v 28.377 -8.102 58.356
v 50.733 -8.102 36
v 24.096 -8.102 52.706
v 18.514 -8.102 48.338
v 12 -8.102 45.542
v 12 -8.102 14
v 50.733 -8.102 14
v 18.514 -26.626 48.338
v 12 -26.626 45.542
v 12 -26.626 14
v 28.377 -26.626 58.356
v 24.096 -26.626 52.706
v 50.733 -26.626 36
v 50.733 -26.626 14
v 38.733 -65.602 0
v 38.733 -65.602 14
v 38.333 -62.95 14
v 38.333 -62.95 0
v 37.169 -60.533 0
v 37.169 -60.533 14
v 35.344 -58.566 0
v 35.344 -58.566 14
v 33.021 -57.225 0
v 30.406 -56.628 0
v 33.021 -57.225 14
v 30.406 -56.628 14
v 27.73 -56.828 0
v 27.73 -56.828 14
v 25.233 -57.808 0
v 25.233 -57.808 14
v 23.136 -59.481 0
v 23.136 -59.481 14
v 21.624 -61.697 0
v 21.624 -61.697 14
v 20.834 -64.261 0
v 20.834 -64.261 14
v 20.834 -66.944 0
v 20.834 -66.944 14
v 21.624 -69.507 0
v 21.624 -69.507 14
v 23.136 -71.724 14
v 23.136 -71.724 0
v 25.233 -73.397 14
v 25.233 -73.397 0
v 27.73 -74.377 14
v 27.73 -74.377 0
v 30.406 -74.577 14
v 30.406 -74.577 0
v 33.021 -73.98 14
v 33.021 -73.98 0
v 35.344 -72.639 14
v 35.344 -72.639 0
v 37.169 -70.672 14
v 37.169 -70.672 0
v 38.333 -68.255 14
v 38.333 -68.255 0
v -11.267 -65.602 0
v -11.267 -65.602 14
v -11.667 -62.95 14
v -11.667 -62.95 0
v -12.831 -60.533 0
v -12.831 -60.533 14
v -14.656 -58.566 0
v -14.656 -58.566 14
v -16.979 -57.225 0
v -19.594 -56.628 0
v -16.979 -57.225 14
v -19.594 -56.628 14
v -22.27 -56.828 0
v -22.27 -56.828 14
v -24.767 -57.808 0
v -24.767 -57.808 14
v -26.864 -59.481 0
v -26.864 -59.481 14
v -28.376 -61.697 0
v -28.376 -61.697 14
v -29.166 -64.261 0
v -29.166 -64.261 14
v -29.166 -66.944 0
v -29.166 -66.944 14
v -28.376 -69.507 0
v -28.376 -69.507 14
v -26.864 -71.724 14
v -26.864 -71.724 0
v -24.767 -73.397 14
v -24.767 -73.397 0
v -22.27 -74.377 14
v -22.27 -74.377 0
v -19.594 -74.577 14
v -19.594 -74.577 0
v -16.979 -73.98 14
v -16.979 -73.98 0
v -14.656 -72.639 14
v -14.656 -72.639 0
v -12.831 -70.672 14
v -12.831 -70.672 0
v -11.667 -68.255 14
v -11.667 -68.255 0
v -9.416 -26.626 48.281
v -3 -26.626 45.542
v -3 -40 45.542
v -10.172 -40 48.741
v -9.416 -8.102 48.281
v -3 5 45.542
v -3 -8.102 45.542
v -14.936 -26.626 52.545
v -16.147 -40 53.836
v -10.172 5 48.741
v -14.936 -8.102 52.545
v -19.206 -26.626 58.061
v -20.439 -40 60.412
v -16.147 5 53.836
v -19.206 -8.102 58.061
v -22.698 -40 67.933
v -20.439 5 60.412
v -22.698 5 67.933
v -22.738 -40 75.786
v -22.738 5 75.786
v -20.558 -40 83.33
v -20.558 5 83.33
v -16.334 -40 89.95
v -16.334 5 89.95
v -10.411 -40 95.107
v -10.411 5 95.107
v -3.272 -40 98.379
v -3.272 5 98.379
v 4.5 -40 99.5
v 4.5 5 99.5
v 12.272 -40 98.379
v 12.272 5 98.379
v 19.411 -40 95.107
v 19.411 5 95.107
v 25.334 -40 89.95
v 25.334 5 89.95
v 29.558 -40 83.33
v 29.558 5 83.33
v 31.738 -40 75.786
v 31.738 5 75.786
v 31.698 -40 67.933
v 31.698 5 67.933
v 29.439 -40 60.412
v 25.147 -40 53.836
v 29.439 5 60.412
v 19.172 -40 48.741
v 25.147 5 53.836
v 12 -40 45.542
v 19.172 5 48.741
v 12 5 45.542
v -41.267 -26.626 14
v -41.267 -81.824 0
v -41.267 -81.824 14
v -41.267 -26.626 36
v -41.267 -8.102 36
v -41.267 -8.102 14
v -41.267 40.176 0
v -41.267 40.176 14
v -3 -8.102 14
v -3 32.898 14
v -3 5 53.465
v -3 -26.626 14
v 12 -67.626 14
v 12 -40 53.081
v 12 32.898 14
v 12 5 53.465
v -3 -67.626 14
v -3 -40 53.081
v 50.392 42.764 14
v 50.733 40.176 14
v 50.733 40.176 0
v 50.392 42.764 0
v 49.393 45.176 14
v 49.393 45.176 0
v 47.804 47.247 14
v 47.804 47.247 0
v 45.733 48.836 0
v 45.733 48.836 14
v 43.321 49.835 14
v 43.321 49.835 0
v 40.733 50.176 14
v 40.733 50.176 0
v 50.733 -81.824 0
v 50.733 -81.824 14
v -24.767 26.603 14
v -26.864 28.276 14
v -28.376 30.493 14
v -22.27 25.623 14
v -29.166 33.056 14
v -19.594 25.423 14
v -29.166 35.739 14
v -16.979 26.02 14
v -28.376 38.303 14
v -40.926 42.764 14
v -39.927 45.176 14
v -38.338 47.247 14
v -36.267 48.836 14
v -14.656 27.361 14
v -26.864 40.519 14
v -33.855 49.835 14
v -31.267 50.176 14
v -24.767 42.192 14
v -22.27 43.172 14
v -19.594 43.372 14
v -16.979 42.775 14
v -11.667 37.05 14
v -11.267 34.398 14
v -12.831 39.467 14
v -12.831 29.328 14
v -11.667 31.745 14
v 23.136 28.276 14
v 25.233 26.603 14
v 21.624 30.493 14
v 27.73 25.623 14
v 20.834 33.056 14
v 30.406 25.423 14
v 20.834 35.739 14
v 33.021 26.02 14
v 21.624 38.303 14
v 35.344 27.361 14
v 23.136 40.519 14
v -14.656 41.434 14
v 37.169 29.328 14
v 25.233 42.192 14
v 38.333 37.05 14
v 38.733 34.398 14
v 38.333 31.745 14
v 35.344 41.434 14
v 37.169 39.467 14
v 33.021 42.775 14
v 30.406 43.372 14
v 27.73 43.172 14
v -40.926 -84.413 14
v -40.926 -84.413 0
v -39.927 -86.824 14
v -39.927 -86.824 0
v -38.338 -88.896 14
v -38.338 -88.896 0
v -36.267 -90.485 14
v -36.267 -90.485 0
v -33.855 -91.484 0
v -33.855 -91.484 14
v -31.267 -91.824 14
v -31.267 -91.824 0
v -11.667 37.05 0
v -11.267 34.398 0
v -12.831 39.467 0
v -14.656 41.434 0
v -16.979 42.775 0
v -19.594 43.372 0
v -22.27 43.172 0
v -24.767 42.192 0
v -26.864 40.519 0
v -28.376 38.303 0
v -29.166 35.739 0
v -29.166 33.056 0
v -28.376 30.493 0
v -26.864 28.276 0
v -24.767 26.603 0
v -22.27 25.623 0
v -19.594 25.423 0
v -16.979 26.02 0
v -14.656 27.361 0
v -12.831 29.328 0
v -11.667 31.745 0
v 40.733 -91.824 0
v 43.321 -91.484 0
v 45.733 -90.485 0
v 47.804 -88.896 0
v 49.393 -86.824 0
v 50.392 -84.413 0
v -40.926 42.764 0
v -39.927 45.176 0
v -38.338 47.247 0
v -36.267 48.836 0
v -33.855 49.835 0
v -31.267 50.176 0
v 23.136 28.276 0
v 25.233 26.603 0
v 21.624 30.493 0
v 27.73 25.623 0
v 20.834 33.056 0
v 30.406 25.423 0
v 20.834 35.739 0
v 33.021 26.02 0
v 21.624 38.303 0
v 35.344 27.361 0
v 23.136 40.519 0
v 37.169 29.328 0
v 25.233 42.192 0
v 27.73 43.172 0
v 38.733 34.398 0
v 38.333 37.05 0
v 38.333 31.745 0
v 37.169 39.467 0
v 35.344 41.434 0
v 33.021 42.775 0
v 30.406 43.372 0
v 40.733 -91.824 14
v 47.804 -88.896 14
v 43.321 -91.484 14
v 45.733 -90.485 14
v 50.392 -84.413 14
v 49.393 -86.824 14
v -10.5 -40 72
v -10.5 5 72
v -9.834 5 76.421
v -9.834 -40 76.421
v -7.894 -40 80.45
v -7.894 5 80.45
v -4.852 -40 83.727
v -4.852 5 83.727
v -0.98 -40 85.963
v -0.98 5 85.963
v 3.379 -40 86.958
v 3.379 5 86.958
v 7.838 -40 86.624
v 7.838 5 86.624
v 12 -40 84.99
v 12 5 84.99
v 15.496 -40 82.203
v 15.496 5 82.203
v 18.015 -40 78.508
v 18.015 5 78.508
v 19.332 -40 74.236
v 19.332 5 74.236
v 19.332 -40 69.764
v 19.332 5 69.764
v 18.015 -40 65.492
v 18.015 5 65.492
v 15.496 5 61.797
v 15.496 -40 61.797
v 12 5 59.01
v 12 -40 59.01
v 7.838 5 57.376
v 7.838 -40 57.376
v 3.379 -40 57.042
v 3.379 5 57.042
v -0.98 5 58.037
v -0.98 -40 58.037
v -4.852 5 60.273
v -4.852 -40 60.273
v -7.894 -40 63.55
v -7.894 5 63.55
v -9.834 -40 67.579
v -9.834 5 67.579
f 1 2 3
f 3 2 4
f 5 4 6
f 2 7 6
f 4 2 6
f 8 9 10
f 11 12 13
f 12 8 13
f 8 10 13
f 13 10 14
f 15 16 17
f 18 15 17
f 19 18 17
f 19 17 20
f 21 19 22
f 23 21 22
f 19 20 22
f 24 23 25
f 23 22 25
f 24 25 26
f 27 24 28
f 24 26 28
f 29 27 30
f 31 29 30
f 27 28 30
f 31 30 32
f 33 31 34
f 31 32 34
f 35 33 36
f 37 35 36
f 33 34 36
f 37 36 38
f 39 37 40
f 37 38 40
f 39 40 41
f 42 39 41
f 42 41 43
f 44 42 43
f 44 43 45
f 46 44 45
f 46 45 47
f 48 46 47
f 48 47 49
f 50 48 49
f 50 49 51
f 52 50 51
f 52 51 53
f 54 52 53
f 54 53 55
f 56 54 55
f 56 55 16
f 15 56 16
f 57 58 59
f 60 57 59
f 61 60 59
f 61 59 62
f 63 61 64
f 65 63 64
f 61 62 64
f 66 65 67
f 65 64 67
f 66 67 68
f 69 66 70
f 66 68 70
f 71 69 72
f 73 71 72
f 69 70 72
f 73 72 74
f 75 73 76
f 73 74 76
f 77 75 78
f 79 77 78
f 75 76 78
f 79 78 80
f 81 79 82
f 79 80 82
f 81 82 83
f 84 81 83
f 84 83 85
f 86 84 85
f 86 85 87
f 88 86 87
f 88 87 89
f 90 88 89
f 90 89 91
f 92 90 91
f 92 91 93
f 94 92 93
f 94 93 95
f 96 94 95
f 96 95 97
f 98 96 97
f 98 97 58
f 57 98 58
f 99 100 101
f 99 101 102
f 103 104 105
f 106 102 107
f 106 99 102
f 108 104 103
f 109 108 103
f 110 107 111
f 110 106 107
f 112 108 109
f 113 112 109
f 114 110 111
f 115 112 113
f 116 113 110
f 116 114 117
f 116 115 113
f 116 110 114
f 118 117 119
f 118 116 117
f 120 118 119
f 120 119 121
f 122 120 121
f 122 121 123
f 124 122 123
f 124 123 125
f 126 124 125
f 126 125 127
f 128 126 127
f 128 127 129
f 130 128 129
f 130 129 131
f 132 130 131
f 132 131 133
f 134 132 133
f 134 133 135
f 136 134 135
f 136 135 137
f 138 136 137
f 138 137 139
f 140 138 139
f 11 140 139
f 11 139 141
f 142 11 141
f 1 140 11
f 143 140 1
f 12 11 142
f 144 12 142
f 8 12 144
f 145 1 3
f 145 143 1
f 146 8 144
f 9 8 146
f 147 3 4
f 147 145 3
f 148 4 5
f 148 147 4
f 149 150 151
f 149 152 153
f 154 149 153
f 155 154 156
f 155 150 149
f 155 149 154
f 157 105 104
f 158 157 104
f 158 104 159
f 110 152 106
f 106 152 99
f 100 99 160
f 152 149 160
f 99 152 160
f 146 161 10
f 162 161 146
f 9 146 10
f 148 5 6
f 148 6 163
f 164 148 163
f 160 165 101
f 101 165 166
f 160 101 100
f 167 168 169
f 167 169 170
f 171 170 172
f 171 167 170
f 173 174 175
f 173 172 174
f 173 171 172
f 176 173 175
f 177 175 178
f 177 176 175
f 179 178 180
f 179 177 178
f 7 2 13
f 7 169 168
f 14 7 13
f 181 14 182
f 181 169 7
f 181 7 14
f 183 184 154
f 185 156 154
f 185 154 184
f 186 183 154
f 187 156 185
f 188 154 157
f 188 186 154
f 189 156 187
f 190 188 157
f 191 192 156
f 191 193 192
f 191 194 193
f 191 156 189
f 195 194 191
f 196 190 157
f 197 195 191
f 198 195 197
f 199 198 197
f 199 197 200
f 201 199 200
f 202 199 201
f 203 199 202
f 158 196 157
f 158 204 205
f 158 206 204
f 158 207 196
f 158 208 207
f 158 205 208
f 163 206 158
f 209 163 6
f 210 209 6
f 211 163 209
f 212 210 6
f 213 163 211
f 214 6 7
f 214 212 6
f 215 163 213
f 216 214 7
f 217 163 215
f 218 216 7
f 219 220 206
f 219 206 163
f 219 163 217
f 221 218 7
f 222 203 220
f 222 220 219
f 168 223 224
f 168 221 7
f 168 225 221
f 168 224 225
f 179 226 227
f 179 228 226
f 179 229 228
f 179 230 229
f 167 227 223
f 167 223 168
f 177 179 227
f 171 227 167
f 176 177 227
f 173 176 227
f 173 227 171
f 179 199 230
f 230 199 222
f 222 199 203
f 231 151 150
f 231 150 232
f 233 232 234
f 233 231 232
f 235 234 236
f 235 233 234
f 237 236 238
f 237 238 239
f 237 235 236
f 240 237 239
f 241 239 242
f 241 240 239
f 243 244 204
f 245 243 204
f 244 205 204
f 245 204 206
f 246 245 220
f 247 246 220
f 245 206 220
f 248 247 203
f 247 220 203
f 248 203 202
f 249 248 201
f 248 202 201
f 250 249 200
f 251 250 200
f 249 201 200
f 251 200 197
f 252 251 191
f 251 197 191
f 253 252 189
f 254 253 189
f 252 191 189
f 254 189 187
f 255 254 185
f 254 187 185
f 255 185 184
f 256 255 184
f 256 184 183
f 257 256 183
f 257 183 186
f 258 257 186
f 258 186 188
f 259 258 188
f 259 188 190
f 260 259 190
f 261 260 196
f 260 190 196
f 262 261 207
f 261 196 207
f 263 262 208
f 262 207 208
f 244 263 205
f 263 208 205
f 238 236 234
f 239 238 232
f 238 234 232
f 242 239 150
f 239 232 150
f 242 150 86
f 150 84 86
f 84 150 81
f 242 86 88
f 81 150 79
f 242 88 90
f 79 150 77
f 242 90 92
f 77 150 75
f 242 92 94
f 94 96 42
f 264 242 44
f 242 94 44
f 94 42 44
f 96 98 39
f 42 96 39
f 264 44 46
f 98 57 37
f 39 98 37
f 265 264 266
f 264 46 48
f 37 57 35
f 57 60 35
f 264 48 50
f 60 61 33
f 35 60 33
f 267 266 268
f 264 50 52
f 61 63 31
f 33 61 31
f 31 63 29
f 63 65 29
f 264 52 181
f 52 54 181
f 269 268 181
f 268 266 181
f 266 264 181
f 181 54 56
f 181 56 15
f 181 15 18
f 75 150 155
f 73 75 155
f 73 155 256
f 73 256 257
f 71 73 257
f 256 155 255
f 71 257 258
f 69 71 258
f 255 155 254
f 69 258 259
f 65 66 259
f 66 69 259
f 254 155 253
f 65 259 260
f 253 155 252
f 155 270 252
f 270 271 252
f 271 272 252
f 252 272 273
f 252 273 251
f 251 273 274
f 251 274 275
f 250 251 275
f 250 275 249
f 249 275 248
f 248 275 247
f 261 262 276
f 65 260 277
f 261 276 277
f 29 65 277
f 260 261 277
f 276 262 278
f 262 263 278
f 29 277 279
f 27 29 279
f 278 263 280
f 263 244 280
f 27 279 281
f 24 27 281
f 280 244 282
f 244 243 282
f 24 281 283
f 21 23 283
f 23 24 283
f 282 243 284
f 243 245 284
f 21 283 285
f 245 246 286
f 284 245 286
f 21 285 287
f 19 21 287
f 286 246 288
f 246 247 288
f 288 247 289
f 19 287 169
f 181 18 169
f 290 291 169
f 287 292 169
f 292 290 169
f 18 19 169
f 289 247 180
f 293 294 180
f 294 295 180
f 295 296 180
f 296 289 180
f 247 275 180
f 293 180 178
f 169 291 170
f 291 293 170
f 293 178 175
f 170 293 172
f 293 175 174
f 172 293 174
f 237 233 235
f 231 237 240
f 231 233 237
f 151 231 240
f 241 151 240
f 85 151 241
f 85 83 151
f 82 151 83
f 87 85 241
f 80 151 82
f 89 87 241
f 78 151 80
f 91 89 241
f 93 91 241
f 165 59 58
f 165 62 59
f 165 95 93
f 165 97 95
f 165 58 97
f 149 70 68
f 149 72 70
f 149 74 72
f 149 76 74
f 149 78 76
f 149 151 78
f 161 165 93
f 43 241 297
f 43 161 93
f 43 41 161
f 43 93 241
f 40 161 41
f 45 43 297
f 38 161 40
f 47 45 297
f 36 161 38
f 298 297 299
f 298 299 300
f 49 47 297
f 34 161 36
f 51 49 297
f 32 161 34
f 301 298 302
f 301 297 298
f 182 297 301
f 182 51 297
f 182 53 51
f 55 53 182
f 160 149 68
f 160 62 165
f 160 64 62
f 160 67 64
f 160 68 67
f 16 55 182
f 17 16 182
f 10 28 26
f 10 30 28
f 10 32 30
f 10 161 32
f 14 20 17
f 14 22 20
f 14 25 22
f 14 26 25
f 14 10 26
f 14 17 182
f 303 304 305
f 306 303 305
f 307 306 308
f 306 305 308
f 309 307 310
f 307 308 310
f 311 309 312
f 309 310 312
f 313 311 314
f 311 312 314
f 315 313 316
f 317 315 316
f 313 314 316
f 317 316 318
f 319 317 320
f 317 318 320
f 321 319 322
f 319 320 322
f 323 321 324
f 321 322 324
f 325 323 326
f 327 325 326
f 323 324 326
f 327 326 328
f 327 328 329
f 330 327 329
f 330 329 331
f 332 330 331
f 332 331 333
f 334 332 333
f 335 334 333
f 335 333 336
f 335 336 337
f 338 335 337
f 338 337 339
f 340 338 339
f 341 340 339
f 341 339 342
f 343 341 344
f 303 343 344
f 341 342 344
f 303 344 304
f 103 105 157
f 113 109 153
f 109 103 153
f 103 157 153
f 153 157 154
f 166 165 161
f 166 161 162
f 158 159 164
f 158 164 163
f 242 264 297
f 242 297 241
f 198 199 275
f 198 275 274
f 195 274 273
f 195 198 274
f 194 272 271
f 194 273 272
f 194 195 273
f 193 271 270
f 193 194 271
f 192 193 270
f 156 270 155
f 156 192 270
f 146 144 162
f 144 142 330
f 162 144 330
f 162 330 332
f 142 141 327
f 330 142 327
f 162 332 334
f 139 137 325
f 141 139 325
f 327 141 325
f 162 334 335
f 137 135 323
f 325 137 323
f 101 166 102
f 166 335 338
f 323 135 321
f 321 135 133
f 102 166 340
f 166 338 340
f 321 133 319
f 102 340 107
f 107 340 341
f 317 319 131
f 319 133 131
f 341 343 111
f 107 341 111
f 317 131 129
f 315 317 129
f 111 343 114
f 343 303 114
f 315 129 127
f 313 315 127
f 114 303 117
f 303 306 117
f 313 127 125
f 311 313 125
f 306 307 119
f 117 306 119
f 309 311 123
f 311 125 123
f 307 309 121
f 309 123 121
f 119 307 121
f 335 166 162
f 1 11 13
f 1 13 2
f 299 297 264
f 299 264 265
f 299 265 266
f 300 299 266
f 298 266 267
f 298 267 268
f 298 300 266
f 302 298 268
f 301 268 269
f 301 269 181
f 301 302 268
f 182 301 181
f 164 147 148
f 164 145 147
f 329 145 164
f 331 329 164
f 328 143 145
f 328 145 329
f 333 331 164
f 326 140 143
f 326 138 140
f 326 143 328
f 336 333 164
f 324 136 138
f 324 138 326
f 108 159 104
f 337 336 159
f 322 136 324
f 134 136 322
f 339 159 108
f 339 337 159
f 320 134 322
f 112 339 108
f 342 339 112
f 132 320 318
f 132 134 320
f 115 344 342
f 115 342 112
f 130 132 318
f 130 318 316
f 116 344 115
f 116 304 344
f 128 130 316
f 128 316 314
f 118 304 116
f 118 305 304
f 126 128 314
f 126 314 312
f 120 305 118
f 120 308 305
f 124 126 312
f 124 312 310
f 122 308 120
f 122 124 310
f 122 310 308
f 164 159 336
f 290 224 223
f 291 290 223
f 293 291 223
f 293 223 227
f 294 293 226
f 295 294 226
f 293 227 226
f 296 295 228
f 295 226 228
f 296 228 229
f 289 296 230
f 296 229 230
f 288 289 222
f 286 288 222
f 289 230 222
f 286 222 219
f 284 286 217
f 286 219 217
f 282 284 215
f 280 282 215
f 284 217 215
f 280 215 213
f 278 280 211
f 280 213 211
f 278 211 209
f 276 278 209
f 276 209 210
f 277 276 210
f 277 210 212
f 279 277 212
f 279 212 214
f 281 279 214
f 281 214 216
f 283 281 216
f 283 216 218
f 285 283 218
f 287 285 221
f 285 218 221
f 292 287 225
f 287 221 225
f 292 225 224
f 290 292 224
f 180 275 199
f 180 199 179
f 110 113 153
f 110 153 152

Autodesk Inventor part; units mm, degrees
sketch "Sketch1" plane through (0, 0, 0) normal (0, 0, 1) x (1, 0, 0)
  line L0 (-41.267, 50.1755) -> (50.733, 50.1755)
  line L1 (50.733, 50.1755) -> (50.733, -91.8245)
  line L2 (50.733, -91.8245) -> (-41.267, -91.8245)
  line L3 (-41.267, -91.8245) -> (-41.267, 50.1755)
  point P0 (0, 0)
  dimension "d0" = 142
  dimension "d1" = 92
extrude "Extrusion1" add sketch "Sketch1" along normal blind 14
sketch "Sketch2" plane through (0, 0, 14) normal (0, 0, 1) x (1, 0, 0)
  line L0 (50.733, 50.1755) -> (-41.267, 50.1755) projected
  line L1 (-41.267, -91.8245) -> (50.733, -91.8245) projected
  line L2 (50.733, -91.8245) -> (50.733, 50.1755) projected
  line L3 (50.733, 50.1755) -> (-41.267, 50.1755) projected
  line L4 (-41.267, 50.1755) -> (-41.267, -91.8245) projected
  circle A0 centre (29.733, 34.3976) radius 9
  circle A1 centre (-20.267, 34.3976) radius 9
  circle A2 centre (-20.267, -65.6024) radius 9
  circle A3 centre (29.733, -65.6024) radius 9
  point P0 (0, 0)
  point P1 (-20.267, 50.1755)
  point P2 (29.733, 50.1755)
  point P3 (50.733, 29.1755)
  point P4 (-41.267, 29.1755)
  point P5 (-41.267, 29.1755)
  point P6 (-20.267, 50.1755)
  point P7 (50.733, 29.1755)
  dimension "d5" = 21
  dimension "d6" = 21
  dimension "d7" = 50
  dimension "d8" = 21
  dimension "d9" = 21
  dimension "d13" = 18
  dimension "d14" = 18
  dimension "d15" = 100
  dimension "d16" = 100
  dimension "d17" = 18
  dimension "d18" = 18
extrude "Extrusion2" cut sketch "Sketch2" against normal through all contours A0 | A1 | A2 | A3
sketch "Sketch3" plane through (0, 0, 14) normal (0, 0, 1) x (1, 0, 0)
  circle A0 centre (-20.267, 34.3976) radius 9 projected
  circle A1 centre (29.733, 34.3976) radius 9 projected
  line L0 (50.733, -91.8245) -> (50.733, 50.1755) projected
  line L1 (-41.267, 50.1755) -> (-41.267, -91.8245) projected
  line L2 (50.733, -8.1024) -> (-41.267, -8.1024)
  line L3 (-41.267, -8.1024) -> (-41.267, -26.6259)
  line L4 (-41.267, -26.6259) -> (50.733, -26.6259)
  line L5 (50.733, -26.6259) -> (50.733, -8.1024)
  point P0 (0, 0)
  point P1 (-20.267, -8.1024)
  point P2 (31.8821, -8.1024)
  point P3 (50.733, -81.8245)
  point P4 (50.733, 40.1755)
  point P5 (-41.267, 40.1755)
  point P6 (-41.267, -81.8245)
  dimension "d22" = 42.5
  dimension "d23" = 42.5
  dimension "d54" = 92
  dimension "d55" = 92
extrude "Extrusion5" add sketch "Sketch3" along normal blind 58 contours L4 L1 L2 L0
chamfer "Chamfer1" distance 36 angle 45 2 edges at (50.733, -17.3641, 72) (-41.267, -17.3641, 72)
sketch "Sketch10" plane through (-41.267, -8.1024, 14) normal (0, 1, 0) x (1, 0, 0)
  line L0 (92, 0) -> (92, -22) projected
  line L1 (0, 0) -> (92, 0) projected
  point P0 (41.267, 14)
sketch "Sketch11" plane through (-41.267, -26.6259, 14) normal (0, -1, 0) x (1, 0, 0)
  line L0 (92, 0) -> (0, 0) projected
  line L1 (36, 58) -> (56, 58) projected
  point P0 (41.267, -14)
  point P1 (46, 58)
  point P2 (46, 0)
  dimension "d64" = 46
  dimension "d65" = 46
ref_plane "Work Plane6" through (4.5, 0, 0) normal (1, 0, 0) x (0, 1, 0)
sketch "Sketch12" plane through (4.5, 0, 0) normal (1, 0, 0) x (0, 1, 0)
  line L0 (-8.1024, 14) -> (32.8976, 14)
  line L1 (-8.1024, 14) -> (-8.1024, 72)
  line L2 (-8.1024, 72) -> (32.8976, 14)
  line L3 (-26.6259, 14) -> (-67.6259, 14)
  line L4 (-67.6259, 14) -> (-26.6259, 72)
  line L5 (-26.6259, 72) -> (-26.6259, 14)
  point P0 (0, 0)
  dimension "d67" = 41
  dimension "d68" = 41
extrude "Extrusion6" add sketch "Sketch12" along normal mid plane 15
sketch "Sketch13" plane through (0, 0, 0) normal (0, 1, 0) x (-1, 0, 0)
  point P0 (0, 0)
ref_plane "Work Plane7" through (0, -17.5, 0) normal (0, 1, 0) x (-1, 0, 0)
sketch "Sketch14" plane through (0, -17.5, 0) normal (0, 1, 0) x (-1, 0, 0)
  line L0 (3, 72) -> (-12, 72) projected
  circle A0 centre (-4.5, 72) radius 27.5
  circle A1 centre (-4.5, 72) radius 15
  point P0 (0, 0)
  dimension "d72" = 55
  dimension "d73" = 30
extrude "Extrusion7" add sketch "Sketch14" along normal mid plane 45
ref_plane "Work Plane8" through (0, 0, 15.25) normal (0, 0, 1) x (1, 0, 0)
sketch "Sketch18" plane through (0, 0, 15.25) normal (0, 0, 1) x (1, 0, 0)
  line L0 (-41.267, 50.1755) -> (-41.267, -91.8245) projected
  point P0 (0, 0)
  point P1 (-41.267, -16.0035)
  dimension "d77" = 66.179
  dimension "d78" = 75.821
sketch "Sketch19" plane through (0, 5, 0) normal (0, 1, 0) x (1, 0, 0)
  circle A0 centre (4.5, -72) radius 15 projected
  point P0 (0, 0)
extrude "Extrusion8" cut sketch "Sketch19" against normal blind 45
fillet "Fillet3" radius 10 4 edges at (50.733, -91.8245, 7) (-41.267, 50.1755, 7) (50.733, 50.1755, 7) (-41.267, -91.8245, 7)
properties material "Nickel-Copper Alloy 400"
